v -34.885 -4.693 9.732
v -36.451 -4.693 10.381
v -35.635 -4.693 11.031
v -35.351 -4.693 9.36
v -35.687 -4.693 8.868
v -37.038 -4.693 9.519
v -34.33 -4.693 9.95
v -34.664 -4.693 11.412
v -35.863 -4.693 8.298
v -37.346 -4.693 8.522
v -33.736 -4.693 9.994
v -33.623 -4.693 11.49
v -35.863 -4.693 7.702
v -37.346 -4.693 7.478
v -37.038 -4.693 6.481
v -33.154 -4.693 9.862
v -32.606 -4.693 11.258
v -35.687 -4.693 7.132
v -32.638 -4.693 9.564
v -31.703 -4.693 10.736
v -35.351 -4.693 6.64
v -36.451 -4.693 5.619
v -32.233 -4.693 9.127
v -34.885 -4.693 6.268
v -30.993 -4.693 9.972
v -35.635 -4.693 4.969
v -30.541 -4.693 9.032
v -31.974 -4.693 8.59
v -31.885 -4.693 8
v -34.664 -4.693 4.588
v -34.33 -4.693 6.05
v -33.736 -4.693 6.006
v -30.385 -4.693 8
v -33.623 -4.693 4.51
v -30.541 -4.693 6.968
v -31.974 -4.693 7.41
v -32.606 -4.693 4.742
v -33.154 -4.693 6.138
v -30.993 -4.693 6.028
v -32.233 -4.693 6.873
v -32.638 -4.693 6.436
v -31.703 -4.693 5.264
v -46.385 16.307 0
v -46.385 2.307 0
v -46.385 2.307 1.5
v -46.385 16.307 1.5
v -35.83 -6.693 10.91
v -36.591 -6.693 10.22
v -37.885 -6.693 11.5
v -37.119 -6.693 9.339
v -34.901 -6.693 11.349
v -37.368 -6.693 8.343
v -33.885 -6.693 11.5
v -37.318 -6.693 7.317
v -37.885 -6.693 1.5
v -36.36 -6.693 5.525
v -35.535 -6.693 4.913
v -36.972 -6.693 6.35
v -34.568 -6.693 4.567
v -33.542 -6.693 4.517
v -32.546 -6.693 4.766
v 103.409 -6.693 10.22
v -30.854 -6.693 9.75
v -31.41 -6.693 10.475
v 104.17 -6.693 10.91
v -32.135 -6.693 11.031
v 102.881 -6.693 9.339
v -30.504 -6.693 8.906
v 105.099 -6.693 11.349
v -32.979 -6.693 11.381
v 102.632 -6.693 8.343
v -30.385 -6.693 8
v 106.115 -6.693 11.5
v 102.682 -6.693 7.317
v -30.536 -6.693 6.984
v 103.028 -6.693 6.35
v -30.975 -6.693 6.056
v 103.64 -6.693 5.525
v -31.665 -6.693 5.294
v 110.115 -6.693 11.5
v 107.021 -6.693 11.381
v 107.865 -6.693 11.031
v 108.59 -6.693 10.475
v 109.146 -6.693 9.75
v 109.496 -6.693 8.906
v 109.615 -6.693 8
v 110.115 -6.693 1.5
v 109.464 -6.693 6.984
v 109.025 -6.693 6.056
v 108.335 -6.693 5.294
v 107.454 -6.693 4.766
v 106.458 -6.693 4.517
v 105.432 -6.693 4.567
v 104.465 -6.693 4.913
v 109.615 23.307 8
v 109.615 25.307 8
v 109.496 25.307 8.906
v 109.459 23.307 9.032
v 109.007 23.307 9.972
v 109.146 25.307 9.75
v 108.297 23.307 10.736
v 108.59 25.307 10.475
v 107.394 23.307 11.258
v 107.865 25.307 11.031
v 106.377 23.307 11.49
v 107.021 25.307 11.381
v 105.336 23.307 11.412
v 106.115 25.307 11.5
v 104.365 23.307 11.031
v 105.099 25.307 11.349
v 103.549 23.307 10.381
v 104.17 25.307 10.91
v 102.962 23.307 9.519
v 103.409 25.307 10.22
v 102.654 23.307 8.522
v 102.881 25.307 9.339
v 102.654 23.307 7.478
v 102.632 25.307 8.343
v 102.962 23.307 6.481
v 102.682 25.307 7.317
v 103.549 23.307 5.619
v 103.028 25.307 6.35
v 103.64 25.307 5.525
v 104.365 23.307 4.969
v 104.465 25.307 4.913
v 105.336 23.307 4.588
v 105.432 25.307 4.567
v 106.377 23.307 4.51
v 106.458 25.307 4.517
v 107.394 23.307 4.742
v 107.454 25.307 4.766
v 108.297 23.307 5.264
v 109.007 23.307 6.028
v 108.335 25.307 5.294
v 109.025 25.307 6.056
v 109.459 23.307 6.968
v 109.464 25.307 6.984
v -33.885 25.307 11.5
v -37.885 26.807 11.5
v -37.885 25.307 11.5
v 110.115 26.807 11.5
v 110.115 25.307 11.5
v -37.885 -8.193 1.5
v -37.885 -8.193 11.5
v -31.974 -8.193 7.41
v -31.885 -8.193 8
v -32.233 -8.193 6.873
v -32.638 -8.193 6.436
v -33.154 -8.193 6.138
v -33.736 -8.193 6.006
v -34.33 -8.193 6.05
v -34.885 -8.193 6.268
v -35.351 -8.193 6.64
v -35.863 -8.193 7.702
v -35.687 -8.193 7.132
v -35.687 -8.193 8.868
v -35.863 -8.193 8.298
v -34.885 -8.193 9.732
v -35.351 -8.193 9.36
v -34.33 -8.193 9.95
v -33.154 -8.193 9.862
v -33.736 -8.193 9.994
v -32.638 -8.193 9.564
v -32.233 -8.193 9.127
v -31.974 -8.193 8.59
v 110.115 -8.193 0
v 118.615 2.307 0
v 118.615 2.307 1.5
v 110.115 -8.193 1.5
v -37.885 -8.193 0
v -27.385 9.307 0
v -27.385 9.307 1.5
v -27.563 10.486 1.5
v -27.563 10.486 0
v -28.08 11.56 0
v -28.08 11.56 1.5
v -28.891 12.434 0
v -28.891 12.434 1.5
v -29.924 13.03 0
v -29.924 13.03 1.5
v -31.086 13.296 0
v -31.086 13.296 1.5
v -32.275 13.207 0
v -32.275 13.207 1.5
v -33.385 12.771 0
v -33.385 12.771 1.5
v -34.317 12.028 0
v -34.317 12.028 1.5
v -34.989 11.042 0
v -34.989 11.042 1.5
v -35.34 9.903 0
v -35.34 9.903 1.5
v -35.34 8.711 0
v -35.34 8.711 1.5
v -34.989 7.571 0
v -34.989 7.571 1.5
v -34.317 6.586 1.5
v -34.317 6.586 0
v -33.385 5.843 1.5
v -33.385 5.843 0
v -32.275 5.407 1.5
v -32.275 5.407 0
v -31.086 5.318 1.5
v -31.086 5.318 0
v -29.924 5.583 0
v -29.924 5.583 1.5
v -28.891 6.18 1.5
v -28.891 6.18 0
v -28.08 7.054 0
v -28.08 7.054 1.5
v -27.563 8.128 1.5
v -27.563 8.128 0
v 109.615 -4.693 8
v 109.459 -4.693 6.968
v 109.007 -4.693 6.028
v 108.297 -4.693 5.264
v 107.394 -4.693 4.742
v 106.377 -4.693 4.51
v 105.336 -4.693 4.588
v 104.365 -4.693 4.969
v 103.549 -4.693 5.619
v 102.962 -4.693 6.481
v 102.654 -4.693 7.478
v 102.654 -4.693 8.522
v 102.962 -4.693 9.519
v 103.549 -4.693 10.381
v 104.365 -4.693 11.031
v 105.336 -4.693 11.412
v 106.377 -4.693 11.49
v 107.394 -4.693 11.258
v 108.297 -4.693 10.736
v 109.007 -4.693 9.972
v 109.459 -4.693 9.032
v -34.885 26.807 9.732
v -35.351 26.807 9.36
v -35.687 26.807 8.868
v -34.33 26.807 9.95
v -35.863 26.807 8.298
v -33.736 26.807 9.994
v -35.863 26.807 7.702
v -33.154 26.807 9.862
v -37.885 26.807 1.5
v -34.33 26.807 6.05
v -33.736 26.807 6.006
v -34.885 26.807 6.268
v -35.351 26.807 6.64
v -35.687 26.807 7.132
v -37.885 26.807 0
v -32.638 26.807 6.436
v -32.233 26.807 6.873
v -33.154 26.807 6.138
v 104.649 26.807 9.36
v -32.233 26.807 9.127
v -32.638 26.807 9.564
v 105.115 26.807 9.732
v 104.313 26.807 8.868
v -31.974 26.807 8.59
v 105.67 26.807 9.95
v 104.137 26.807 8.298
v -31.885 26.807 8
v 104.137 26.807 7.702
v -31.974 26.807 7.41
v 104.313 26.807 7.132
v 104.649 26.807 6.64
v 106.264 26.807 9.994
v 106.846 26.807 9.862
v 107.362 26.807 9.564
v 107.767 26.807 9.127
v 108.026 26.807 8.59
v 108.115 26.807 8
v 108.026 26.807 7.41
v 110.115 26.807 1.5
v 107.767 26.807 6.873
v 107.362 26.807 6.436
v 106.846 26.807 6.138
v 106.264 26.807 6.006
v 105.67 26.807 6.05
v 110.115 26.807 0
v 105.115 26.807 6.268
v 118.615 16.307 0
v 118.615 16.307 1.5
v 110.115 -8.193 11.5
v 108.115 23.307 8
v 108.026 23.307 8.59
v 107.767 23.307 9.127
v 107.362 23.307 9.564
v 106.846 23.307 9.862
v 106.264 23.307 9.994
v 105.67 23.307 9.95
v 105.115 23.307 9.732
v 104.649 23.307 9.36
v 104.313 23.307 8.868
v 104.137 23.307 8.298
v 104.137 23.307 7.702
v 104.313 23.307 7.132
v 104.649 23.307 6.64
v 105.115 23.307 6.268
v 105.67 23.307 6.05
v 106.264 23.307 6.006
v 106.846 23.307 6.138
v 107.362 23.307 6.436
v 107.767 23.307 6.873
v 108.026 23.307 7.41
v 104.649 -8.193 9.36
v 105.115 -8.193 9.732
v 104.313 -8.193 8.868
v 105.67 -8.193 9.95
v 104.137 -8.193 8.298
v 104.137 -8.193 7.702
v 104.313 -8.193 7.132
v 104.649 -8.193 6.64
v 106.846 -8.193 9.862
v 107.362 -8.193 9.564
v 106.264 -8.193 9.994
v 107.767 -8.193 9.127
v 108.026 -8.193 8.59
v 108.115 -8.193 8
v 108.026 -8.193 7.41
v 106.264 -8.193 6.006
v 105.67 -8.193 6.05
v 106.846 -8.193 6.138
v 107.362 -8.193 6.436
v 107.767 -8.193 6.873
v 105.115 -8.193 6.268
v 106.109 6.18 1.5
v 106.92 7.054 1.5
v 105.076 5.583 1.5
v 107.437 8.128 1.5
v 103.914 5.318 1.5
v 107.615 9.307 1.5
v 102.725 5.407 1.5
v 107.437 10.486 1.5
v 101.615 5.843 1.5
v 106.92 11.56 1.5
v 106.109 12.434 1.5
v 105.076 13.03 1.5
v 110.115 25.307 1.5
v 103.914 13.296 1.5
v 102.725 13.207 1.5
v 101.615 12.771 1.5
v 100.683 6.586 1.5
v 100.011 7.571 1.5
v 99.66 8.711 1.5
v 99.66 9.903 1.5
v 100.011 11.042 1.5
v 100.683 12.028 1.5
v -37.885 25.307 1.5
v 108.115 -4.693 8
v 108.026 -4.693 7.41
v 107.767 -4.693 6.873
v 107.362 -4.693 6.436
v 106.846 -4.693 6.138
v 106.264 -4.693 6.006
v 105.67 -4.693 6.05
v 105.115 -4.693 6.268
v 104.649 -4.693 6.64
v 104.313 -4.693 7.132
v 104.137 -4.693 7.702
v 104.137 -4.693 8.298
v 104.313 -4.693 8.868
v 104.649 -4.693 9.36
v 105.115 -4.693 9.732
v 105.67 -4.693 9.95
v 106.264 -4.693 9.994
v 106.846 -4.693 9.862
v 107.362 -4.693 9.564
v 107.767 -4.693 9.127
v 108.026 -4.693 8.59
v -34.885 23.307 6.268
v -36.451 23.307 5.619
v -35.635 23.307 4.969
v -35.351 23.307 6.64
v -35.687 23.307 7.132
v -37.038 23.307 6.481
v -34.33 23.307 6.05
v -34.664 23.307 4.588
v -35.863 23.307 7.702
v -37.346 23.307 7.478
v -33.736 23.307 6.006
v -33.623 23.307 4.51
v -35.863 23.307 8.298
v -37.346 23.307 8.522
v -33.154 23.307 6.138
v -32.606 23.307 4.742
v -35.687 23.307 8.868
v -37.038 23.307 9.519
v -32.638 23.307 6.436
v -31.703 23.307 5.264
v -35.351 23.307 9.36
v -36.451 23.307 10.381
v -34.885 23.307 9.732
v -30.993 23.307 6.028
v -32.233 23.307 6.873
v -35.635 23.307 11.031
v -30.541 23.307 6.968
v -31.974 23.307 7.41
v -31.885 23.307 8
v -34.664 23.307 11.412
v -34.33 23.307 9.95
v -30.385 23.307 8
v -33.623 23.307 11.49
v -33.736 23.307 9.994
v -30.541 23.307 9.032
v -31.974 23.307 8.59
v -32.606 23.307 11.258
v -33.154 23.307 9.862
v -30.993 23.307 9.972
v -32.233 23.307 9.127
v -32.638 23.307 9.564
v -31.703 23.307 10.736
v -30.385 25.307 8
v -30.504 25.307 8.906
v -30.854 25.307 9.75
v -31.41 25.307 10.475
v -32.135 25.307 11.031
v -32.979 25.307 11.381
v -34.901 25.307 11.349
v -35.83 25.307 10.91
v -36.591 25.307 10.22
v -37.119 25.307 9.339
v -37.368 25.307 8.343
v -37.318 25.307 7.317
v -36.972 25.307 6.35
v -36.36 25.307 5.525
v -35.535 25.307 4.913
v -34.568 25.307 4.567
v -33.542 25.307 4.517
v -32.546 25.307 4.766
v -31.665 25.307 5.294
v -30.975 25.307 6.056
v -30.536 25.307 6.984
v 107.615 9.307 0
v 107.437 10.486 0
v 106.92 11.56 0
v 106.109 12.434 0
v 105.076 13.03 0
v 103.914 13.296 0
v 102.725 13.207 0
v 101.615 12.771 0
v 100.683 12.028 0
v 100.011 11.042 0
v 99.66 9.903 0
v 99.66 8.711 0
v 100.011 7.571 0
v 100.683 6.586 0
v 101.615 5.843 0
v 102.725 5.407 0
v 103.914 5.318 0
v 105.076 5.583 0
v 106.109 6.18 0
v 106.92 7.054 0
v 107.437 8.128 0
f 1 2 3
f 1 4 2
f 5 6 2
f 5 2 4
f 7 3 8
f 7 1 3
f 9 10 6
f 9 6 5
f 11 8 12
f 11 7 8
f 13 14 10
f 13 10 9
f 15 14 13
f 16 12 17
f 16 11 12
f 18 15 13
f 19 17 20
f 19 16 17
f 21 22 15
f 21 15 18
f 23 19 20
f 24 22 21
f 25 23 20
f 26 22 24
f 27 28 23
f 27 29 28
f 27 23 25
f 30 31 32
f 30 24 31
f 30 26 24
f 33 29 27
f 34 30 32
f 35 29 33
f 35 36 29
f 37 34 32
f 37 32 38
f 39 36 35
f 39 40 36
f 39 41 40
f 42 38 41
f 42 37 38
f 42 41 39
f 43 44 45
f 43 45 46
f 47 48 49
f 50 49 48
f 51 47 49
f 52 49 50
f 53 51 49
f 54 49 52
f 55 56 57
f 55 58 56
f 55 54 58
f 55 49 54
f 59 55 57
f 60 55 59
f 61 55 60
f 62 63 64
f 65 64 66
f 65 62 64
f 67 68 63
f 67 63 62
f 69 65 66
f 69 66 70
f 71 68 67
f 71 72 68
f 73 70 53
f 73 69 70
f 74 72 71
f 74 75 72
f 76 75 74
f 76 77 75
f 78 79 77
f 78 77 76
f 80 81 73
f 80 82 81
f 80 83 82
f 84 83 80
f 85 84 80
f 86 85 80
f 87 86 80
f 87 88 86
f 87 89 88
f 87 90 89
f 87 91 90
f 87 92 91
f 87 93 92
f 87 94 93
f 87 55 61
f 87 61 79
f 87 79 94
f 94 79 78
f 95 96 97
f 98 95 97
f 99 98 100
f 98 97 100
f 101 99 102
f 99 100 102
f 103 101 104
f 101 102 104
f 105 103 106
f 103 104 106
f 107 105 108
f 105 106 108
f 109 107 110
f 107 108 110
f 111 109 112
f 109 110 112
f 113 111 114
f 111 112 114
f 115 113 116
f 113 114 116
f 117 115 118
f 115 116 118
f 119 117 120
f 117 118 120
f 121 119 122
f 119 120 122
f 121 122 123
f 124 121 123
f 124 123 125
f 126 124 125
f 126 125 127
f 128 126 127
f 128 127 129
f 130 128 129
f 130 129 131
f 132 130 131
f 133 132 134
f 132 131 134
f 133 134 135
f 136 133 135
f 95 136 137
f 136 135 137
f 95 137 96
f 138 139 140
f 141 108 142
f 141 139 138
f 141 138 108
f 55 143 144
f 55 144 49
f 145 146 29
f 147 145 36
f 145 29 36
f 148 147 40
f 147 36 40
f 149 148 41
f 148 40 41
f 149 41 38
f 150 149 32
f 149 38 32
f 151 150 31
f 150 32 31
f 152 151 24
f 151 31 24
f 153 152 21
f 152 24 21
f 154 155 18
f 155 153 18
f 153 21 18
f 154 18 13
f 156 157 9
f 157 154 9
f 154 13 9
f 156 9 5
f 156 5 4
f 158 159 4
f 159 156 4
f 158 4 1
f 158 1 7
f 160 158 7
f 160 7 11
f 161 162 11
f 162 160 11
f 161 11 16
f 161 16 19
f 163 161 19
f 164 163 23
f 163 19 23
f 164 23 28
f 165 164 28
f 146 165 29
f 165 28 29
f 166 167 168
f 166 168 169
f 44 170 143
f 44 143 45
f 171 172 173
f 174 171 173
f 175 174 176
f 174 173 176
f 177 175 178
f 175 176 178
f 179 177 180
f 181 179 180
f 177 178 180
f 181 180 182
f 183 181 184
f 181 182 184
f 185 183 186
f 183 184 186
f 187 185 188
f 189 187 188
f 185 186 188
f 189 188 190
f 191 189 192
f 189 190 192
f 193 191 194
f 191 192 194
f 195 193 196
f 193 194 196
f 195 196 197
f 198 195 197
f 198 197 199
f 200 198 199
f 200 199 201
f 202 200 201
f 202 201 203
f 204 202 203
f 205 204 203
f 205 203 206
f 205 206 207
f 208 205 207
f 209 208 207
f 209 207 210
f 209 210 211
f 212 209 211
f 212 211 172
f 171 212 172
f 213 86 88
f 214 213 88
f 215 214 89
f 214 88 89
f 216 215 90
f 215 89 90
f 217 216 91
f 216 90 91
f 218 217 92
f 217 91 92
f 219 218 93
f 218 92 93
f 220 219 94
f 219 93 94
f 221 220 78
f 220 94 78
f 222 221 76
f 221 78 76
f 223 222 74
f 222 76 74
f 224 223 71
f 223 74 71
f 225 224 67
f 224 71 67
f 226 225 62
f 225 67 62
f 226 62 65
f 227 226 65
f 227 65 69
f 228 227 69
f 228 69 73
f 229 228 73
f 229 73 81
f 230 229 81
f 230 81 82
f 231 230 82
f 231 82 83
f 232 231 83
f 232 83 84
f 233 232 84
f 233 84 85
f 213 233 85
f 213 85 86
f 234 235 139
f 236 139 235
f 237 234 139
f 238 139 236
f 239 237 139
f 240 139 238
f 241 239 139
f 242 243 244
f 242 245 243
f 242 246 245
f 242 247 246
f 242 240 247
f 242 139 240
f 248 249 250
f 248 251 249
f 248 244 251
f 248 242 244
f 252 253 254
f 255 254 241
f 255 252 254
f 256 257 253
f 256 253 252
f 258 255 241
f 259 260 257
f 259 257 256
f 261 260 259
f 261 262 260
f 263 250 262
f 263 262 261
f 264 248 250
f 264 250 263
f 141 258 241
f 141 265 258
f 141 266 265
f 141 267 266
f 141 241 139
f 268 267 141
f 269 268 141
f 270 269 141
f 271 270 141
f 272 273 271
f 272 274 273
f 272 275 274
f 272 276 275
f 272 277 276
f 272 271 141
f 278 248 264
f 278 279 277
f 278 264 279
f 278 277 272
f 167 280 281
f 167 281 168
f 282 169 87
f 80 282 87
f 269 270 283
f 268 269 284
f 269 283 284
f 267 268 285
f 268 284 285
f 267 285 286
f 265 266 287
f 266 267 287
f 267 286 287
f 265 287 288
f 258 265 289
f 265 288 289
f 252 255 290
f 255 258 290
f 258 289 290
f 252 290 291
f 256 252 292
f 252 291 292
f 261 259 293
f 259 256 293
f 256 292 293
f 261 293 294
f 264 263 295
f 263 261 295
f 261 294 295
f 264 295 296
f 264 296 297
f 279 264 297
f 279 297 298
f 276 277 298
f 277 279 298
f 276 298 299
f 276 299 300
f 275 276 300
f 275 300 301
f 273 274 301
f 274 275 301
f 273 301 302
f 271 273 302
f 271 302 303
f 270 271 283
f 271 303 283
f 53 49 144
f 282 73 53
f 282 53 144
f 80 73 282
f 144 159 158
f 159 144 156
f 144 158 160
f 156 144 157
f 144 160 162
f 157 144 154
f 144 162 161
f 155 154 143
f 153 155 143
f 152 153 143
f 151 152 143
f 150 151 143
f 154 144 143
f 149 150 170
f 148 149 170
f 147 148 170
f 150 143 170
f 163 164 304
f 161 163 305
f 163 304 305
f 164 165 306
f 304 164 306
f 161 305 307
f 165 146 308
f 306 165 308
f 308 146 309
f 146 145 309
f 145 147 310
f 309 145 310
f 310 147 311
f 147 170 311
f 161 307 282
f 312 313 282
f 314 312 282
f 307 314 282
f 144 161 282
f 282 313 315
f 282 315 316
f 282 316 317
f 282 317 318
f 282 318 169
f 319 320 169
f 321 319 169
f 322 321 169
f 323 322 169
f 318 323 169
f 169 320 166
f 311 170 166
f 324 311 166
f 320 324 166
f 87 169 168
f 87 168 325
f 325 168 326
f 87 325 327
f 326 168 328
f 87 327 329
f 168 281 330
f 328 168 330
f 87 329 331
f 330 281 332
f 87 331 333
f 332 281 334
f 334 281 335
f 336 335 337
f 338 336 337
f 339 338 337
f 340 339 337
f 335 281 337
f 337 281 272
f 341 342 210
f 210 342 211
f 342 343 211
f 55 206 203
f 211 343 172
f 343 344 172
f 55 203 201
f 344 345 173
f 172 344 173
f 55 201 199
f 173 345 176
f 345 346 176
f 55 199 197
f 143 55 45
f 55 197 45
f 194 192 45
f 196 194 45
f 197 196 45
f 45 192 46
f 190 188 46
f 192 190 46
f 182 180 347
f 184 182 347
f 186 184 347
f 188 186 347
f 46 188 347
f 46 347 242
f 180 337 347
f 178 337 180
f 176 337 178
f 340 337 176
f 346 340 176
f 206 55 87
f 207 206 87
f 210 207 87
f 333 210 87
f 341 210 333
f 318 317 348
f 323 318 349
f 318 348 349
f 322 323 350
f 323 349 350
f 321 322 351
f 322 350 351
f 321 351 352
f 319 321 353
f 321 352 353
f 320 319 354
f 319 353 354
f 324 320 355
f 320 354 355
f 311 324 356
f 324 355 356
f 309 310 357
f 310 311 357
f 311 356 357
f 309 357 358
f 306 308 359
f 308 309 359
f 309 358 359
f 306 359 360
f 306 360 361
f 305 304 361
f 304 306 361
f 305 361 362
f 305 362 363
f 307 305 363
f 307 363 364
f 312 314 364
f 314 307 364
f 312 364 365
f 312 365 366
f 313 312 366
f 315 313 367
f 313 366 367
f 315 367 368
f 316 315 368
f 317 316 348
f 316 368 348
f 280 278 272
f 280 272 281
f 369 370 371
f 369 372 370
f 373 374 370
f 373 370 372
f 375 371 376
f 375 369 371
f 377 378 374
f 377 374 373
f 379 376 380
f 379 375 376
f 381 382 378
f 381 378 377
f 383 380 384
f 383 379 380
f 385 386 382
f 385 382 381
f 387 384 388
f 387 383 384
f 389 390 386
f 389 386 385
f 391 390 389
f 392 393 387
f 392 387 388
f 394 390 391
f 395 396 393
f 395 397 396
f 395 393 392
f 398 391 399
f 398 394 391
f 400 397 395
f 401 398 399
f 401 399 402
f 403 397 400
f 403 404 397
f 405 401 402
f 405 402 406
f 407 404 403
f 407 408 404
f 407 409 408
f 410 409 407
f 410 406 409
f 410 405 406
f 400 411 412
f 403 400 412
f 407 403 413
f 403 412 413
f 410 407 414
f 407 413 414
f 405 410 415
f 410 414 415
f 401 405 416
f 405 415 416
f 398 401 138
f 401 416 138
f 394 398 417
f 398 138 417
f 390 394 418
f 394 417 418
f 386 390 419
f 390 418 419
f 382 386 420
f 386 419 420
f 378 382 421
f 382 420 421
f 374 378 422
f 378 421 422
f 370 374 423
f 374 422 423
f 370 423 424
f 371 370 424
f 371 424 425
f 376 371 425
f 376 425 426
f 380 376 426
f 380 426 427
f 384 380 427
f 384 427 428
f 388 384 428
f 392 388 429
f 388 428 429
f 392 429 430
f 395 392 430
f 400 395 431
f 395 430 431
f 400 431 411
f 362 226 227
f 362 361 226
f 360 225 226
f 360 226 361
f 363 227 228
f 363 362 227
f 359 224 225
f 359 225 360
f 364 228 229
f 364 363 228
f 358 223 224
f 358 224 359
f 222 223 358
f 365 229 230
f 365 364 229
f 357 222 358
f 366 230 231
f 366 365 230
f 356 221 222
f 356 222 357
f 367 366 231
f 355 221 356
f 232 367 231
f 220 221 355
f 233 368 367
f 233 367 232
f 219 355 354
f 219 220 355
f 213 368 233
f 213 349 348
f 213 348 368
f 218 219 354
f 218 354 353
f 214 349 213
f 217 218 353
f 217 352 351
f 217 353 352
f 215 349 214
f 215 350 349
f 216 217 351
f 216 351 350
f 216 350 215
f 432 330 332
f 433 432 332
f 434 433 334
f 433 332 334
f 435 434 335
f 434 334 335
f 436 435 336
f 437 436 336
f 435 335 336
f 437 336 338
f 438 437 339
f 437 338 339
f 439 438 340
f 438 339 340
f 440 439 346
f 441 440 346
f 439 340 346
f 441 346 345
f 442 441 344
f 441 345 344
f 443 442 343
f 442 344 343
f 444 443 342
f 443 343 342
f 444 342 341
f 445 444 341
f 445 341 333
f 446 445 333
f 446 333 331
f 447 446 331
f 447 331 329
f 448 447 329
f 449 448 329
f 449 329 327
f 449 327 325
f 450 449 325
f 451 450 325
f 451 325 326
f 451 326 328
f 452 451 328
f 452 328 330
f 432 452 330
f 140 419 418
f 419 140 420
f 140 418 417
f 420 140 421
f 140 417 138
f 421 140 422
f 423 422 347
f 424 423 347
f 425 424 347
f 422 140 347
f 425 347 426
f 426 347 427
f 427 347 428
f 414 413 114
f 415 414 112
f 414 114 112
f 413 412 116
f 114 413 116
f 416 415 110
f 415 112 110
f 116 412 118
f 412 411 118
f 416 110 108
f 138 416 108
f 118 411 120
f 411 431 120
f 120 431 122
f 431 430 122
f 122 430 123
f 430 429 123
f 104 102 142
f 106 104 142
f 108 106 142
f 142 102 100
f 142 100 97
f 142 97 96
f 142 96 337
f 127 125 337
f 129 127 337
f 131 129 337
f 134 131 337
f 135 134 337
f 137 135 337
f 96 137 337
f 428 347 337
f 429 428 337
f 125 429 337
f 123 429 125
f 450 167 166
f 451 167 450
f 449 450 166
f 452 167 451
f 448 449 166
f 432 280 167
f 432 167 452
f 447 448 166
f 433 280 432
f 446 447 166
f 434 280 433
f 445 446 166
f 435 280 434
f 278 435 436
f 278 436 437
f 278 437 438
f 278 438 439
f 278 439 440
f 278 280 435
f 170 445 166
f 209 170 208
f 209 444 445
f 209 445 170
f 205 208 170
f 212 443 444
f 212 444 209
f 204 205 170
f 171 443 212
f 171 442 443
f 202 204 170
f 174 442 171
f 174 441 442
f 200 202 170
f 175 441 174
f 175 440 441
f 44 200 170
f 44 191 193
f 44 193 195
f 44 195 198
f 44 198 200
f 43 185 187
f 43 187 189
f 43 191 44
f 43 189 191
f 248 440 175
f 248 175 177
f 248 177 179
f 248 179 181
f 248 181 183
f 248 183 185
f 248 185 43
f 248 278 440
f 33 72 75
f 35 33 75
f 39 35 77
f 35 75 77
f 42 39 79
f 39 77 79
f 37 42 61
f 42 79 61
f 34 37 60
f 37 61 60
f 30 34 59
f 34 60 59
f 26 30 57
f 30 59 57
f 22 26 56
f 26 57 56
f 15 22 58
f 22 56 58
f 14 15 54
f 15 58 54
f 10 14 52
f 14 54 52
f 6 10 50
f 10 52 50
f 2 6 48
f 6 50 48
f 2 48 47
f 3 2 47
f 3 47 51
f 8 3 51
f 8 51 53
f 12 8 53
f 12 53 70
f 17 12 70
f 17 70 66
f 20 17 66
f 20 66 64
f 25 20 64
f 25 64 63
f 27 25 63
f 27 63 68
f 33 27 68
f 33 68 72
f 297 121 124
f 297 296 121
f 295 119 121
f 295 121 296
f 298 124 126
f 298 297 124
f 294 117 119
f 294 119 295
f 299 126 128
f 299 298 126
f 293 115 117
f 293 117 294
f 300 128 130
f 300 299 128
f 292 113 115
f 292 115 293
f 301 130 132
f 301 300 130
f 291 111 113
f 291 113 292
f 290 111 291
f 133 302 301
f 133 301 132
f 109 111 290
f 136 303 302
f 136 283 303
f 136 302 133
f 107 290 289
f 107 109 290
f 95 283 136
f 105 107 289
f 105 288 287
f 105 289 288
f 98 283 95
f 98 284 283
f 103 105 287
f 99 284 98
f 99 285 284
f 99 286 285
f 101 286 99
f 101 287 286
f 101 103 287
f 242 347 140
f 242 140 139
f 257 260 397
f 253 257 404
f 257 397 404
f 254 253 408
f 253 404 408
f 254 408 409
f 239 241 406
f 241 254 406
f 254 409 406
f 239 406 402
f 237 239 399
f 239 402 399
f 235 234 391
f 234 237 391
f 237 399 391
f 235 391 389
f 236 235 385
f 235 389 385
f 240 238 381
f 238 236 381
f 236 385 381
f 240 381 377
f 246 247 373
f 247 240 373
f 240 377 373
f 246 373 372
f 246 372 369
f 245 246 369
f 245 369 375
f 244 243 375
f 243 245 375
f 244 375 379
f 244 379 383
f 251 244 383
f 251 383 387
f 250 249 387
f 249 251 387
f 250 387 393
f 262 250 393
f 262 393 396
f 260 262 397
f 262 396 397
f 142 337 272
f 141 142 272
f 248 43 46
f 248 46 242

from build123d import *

# Parameters (mm, degrees)
SALIENTE_EXTRUIR1_DEPTH = 1.5
CROQUIS4_W              = 148
CROQUIS4_H              = 1.5
SALIENTE_EXTRUIR2_DEPTH = 10
CROQUIS5_W              = 148
CROQUIS5_H              = 1.5
SALIENTE_EXTRUIR3_DEPTH = 10
CROQUIS6_R              = 2
CORTAR_EXTRUIR6_DEPTH   = 3.5
CROQUIS9_R              = 3.5
SALIENTE_EXTRUIR5_DEPTH = 2
CROQUIS11_R             = 2
CORTAR_EXTRUIR7_DEPTH   = 2
CROQUIS12_R             = 3.5
SALIENTE_EXTRUIR6_DEPTH = 2
CROQUIS13_R             = 2
CORTAR_EXTRUIR8_DEPTH   = 2
CORTAR_EXTRUIR9_REACH   = 37
CROQUIS14_R             = 2
CROQUIS15_R             = 3.5
SALIENTE_EXTRUIR7_DEPTH = 2
CROQUIS16_R             = 2
CORTAR_EXTRUIR10_DEPTH  = 2
CORTAR_EXTRUIR11_REACH  = 37
CROQUIS17_R             = 2
CROQUIS18_R             = 3.5
SALIENTE_EXTRUIR8_DEPTH = 2
CROQUIS19_R             = 2
CORTAR_EXTRUIR12_DEPTH  = 2
CORTAR_EXTRUIR13_REACH  = 3.5
CROQUIS20_R             = 4


with BuildPart() as part:
    # Croquis1 → Saliente-Extruir1 (new body)
    with BuildSketch(Plane.XY):
        Polygon((110.114969998, 26.806936713), (118.614969998, 16.306936713), (118.614969998, 2.306936713), (110.114969998, -8.193063287), (-37.885030002, -8.193063287), (-46.385030002, 2.306936713), (-46.385030002, 16.306936713), (-37.885030002, 26.806936713), align=None)
    extrude(amount=SALIENTE_EXTRUIR1_DEPTH)

    # Croquis4 → Saliente-Extruir2 (add)
    with BuildSketch(Plane.XY.offset(1.5)):
        with Locations((36.114969998, 26.056936713)):
            Rectangle(CROQUIS4_W, CROQUIS4_H)
    extrude(amount=SALIENTE_EXTRUIR2_DEPTH)

    # Croquis5 → Saliente-Extruir3 (add)
    with BuildSketch(Plane.XY.offset(1.5)):
        with Locations((36.114969998, -7.443063287)):
            Rectangle(CROQUIS5_W, CROQUIS5_H)
    extrude(amount=SALIENTE_EXTRUIR3_DEPTH)

    # Croquis6 → Cortar-Extruir6 (cut)
    with BuildSketch(Plane(origin=(0, 26.806936713, 0), x_dir=(1, 0, 0), z_dir=(0, 1, 0))):
        with Locations((106.114969998, -8)):
            Circle(CROQUIS6_R)
        with Locations((-33.885030002, -8)):
            Circle(CROQUIS6_R)
    extrude(amount=-CORTAR_EXTRUIR6_DEPTH, mode=Mode.SUBTRACT)

    # Croquis9 → Saliente-Extruir5 (add)
    with BuildSketch(Plane.XZ.offset(-25.306936713)):
        with Locations((-33.885030002, 8)):
            Circle(CROQUIS9_R)
    extrude(amount=SALIENTE_EXTRUIR5_DEPTH)

    # Croquis11 → Cortar-Extruir7 (cut)
    with BuildSketch(Plane.XZ.offset(-23.306936713)):
        with Locations((-33.885030002, 8)):
            Circle(CROQUIS11_R)
    extrude(amount=-CORTAR_EXTRUIR7_DEPTH, mode=Mode.SUBTRACT)

    # Croquis12 → Saliente-Extruir6 (add)
    with BuildSketch(Plane.XZ.offset(-25.306936713)):
        with Locations((106.114969998, 8)):
            Circle(CROQUIS12_R)
    extrude(amount=SALIENTE_EXTRUIR6_DEPTH)

    # Croquis13 → Cortar-Extruir8 (cut)
    with BuildSketch(Plane.XZ.offset(-23.306936713)):
        with Locations((106.114969998, 8)):
            Circle(CROQUIS13_R)
    extrude(amount=-CORTAR_EXTRUIR8_DEPTH, mode=Mode.SUBTRACT)

    # Croquis14 → Cortar-Extruir9 (cut, up to next)
    with BuildSketch(Plane.XZ.offset(8.193063287), mode=Mode.PRIVATE) as cortar_extruir9_sk1:
        with Locations((-33.885030002, 8)):
            Circle(CROQUIS14_R)
    cortar_extruir9_tool1 = extrude(cortar_extruir9_sk1.sketch, amount=-CORTAR_EXTRUIR9_REACH, mode=Mode.PRIVATE) & part.part
    add(cortar_extruir9_tool1.solids().sort_by_distance((-33.88503, -8.193063, 8))[0], mode=Mode.SUBTRACT)

    # Croquis15 → Saliente-Extruir7 (add)
    with BuildSketch(Plane(origin=(0, -6.693063287, 0), x_dir=(1, 0, 0), z_dir=(0, 1, 0))):
        with Locations((-33.885030002, -8)):
            Circle(CROQUIS15_R)
    extrude(amount=SALIENTE_EXTRUIR7_DEPTH)

    # Croquis16 → Cortar-Extruir10 (cut)
    with BuildSketch(Plane(origin=(0, -4.693063287, 0), x_dir=(1, 0, 0), z_dir=(0, 1, 0))):
        with Locations((-33.885030002, -8)):
            Circle(CROQUIS16_R)
    extrude(amount=-CORTAR_EXTRUIR10_DEPTH, mode=Mode.SUBTRACT)

    # Croquis17 → Cortar-Extruir11 (cut, up to next)
    with BuildSketch(Plane.XZ.offset(8.193063287), mode=Mode.PRIVATE) as cortar_extruir11_sk1:
        with Locations((106.114969998, 8)):
            Circle(CROQUIS17_R)
    cortar_extruir11_tool1 = extrude(cortar_extruir11_sk1.sketch, amount=-CORTAR_EXTRUIR11_REACH, mode=Mode.PRIVATE) & part.part
    add(cortar_extruir11_tool1.solids().sort_by_distance((106.11497, -8.193063, 8))[0], mode=Mode.SUBTRACT)

    # Croquis18 → Saliente-Extruir8 (add)
    with BuildSketch(Plane(origin=(0, -6.693063287, 0), x_dir=(1, 0, 0), z_dir=(0, 1, 0))):
        with Locations((106.114969998, -8)):
            Circle(CROQUIS18_R)
    extrude(amount=SALIENTE_EXTRUIR8_DEPTH)

    # Croquis19 → Cortar-Extruir12 (cut)
    with BuildSketch(Plane(origin=(0, -4.693063287, 0), x_dir=(1, 0, 0), z_dir=(0, 1, 0))):
        with Locations((106.114969998, -8)):
            Circle(CROQUIS19_R)
    extrude(amount=-CORTAR_EXTRUIR12_DEPTH, mode=Mode.SUBTRACT)

    # Croquis20 → Cortar-Extruir13 (cut, up to next)
    with BuildSketch(Plane.XY.offset(1.5), mode=Mode.PRIVATE) as cortar_extruir13_sk1:
        with Locations((-31.385030002, 9.306936713)):
            Circle(CROQUIS20_R)
    cortar_extruir13_tool1 = extrude(cortar_extruir13_sk1.sketch, amount=-CORTAR_EXTRUIR13_REACH, mode=Mode.PRIVATE) & part.part
    add(cortar_extruir13_tool1.solids().sort_by_distance((-31.38503, 9.306937, 1.5))[0], mode=Mode.SUBTRACT)
    # Croquis20 → Cortar-Extruir13 (cut, up to next)
    with BuildSketch(Plane.XY.offset(1.5), mode=Mode.PRIVATE) as cortar_extruir13_sk2:
        with Locations((103.614969998, 9.306936713)):
            Circle(CROQUIS20_R)
    cortar_extruir13_tool2 = extrude(cortar_extruir13_sk2.sketch, amount=-CORTAR_EXTRUIR13_REACH, mode=Mode.PRIVATE) & part.part
    add(cortar_extruir13_tool2.solids().sort_by_distance((103.61497, 9.306937, 1.5))[0], mode=Mode.SUBTRACT)


solid = part.part
